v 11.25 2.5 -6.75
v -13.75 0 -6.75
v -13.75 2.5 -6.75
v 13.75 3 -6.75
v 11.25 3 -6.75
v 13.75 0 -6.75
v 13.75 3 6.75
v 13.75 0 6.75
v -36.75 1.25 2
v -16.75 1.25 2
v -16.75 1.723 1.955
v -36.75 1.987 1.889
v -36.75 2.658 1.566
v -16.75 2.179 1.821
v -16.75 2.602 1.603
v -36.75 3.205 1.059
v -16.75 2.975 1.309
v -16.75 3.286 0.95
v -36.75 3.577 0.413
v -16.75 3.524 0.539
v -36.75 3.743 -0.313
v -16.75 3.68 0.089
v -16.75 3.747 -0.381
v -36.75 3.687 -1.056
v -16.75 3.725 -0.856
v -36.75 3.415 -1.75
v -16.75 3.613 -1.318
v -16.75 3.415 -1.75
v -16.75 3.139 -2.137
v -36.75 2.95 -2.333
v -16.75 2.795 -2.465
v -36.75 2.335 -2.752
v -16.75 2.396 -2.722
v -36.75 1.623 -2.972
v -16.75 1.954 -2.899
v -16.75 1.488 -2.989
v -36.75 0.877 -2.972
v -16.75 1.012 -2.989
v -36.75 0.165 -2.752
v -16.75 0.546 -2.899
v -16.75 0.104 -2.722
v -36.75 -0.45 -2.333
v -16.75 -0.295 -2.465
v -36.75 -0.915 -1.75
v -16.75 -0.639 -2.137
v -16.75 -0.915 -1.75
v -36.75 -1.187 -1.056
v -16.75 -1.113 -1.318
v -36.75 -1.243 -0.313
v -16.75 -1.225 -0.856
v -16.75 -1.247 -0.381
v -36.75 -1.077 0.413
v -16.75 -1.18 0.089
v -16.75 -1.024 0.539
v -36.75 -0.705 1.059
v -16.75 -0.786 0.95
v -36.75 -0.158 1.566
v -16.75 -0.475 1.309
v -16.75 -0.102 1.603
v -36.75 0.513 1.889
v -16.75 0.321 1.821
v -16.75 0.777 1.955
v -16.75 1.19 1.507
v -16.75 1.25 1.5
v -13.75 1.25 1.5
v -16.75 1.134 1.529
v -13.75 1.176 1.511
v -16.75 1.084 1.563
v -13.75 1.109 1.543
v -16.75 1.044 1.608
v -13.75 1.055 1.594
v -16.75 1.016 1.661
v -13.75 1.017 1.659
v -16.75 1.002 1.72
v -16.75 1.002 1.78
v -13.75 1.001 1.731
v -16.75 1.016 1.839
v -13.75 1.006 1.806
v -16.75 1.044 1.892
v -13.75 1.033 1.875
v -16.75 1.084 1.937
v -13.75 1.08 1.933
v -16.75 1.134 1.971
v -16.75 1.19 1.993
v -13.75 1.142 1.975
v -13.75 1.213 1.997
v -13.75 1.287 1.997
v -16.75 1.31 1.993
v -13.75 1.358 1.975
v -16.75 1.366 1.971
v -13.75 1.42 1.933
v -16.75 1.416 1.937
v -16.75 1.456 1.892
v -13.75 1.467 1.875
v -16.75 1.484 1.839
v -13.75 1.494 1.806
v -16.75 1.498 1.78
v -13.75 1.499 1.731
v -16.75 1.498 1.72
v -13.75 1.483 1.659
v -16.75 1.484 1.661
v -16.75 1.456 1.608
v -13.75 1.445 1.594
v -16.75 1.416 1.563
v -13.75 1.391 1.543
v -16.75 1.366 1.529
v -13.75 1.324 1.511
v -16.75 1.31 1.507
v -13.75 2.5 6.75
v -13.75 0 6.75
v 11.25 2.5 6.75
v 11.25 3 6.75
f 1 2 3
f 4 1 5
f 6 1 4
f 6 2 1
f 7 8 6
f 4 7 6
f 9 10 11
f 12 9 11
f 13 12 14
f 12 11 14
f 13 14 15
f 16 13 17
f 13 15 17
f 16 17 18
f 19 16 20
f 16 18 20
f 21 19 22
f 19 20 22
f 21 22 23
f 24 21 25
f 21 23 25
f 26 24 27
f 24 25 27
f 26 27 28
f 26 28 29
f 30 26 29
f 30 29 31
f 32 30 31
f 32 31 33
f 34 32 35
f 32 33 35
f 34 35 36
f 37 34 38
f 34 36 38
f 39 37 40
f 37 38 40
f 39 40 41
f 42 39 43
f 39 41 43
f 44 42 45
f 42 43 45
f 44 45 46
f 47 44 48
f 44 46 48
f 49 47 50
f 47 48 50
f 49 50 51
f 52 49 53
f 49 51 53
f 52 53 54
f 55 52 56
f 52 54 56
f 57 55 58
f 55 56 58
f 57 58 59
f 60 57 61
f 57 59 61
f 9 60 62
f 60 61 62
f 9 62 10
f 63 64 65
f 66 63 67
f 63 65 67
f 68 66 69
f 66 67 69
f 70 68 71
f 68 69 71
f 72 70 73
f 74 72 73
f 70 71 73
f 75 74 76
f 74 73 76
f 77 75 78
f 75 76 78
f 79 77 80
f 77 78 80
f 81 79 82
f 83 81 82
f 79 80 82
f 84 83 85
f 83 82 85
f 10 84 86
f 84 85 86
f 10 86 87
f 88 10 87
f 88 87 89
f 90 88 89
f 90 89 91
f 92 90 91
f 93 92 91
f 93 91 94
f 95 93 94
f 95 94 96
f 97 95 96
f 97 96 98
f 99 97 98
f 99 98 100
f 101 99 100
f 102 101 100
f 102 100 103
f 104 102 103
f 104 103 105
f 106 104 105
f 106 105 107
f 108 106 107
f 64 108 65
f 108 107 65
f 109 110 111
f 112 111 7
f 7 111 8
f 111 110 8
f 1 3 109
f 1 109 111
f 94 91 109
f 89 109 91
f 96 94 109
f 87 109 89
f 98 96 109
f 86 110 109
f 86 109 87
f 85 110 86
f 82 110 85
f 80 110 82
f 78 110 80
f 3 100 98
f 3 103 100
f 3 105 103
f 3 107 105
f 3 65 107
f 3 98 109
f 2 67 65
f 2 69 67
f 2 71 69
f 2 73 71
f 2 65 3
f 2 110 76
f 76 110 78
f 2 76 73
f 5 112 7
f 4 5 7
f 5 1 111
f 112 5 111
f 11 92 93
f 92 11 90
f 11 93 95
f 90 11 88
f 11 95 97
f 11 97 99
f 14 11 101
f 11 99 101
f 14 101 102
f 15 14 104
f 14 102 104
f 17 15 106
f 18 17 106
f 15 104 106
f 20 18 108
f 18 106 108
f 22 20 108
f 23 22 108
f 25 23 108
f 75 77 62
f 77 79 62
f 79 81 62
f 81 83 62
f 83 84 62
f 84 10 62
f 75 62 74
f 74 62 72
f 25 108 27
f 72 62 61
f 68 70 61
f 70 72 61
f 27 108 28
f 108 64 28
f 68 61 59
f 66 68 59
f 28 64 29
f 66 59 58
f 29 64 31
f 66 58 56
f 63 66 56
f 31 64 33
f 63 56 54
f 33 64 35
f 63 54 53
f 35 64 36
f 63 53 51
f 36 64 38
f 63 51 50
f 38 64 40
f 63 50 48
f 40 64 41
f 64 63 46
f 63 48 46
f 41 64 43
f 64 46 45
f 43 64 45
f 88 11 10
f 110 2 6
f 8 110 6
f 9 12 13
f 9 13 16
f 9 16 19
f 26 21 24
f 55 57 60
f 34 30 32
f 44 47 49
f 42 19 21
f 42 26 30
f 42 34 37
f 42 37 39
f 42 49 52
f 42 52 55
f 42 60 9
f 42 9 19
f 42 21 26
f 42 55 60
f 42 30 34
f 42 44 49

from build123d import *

# Parameters (mm, degrees)
SKETCH_1_W      = 27.5
SKETCH_1_H      = 13.5
EXTRUDE_1_DEPTH = 2.5
SKETCH_2_W      = 2.5
SKETCH_2_H      = 13.5
EXTRUDE_2_DEPTH = 3
SKETCH_3_R      = 0.25
EXTRUDE_3_DEPTH = 3
SKETCH_4_R      = 0.25
SKETCH_4_R_2    = 2.5
EXTRUDE_5_DEPTH = 20


with BuildPart() as part:
    # Эскиз1 → Бобышка-Вытянуть1 (new body)
    with BuildSketch(Plane(origin=(0, 0, 0), x_dir=(1, 0, 0), z_dir=(0, 1, 0))):
        Rectangle(SKETCH_1_W, SKETCH_1_H)
    extrude(amount=EXTRUDE_1_DEPTH)

    # Эскиз2 → Бобышка-Вытянуть2 (add)
    with BuildSketch(Plane.XZ):
        with Locations((12.5, 0)):
            Rectangle(SKETCH_2_W, SKETCH_2_H)
    extrude(amount=-EXTRUDE_2_DEPTH)

    # Эскиз3 → Бобышка-Вытянуть3 (add)
    with BuildSketch(Plane.ZY.offset(13.75)):
        with Locations(Location((1.75, 1.25, 0), (0, 0, 180))):
            Circle(SKETCH_3_R)
    extrude(amount=EXTRUDE_3_DEPTH)

    # Эскиз4 → Бобышка-Вытянуть5 (add)
    with BuildSketch(Plane.ZY.offset(16.75)):
        with Locations(Location((1.75, 1.25, 0), (0, 0, 180))):
            Circle(SKETCH_4_R)
        with Locations((-0.5, 1.25)):
            Circle(SKETCH_4_R_2)
        with Locations(Location((1.75, 1.25, 0), (0, 0, 180))):
            Circle(SKETCH_4_R)
    extrude(amount=EXTRUDE_5_DEPTH)


solid = part.part
